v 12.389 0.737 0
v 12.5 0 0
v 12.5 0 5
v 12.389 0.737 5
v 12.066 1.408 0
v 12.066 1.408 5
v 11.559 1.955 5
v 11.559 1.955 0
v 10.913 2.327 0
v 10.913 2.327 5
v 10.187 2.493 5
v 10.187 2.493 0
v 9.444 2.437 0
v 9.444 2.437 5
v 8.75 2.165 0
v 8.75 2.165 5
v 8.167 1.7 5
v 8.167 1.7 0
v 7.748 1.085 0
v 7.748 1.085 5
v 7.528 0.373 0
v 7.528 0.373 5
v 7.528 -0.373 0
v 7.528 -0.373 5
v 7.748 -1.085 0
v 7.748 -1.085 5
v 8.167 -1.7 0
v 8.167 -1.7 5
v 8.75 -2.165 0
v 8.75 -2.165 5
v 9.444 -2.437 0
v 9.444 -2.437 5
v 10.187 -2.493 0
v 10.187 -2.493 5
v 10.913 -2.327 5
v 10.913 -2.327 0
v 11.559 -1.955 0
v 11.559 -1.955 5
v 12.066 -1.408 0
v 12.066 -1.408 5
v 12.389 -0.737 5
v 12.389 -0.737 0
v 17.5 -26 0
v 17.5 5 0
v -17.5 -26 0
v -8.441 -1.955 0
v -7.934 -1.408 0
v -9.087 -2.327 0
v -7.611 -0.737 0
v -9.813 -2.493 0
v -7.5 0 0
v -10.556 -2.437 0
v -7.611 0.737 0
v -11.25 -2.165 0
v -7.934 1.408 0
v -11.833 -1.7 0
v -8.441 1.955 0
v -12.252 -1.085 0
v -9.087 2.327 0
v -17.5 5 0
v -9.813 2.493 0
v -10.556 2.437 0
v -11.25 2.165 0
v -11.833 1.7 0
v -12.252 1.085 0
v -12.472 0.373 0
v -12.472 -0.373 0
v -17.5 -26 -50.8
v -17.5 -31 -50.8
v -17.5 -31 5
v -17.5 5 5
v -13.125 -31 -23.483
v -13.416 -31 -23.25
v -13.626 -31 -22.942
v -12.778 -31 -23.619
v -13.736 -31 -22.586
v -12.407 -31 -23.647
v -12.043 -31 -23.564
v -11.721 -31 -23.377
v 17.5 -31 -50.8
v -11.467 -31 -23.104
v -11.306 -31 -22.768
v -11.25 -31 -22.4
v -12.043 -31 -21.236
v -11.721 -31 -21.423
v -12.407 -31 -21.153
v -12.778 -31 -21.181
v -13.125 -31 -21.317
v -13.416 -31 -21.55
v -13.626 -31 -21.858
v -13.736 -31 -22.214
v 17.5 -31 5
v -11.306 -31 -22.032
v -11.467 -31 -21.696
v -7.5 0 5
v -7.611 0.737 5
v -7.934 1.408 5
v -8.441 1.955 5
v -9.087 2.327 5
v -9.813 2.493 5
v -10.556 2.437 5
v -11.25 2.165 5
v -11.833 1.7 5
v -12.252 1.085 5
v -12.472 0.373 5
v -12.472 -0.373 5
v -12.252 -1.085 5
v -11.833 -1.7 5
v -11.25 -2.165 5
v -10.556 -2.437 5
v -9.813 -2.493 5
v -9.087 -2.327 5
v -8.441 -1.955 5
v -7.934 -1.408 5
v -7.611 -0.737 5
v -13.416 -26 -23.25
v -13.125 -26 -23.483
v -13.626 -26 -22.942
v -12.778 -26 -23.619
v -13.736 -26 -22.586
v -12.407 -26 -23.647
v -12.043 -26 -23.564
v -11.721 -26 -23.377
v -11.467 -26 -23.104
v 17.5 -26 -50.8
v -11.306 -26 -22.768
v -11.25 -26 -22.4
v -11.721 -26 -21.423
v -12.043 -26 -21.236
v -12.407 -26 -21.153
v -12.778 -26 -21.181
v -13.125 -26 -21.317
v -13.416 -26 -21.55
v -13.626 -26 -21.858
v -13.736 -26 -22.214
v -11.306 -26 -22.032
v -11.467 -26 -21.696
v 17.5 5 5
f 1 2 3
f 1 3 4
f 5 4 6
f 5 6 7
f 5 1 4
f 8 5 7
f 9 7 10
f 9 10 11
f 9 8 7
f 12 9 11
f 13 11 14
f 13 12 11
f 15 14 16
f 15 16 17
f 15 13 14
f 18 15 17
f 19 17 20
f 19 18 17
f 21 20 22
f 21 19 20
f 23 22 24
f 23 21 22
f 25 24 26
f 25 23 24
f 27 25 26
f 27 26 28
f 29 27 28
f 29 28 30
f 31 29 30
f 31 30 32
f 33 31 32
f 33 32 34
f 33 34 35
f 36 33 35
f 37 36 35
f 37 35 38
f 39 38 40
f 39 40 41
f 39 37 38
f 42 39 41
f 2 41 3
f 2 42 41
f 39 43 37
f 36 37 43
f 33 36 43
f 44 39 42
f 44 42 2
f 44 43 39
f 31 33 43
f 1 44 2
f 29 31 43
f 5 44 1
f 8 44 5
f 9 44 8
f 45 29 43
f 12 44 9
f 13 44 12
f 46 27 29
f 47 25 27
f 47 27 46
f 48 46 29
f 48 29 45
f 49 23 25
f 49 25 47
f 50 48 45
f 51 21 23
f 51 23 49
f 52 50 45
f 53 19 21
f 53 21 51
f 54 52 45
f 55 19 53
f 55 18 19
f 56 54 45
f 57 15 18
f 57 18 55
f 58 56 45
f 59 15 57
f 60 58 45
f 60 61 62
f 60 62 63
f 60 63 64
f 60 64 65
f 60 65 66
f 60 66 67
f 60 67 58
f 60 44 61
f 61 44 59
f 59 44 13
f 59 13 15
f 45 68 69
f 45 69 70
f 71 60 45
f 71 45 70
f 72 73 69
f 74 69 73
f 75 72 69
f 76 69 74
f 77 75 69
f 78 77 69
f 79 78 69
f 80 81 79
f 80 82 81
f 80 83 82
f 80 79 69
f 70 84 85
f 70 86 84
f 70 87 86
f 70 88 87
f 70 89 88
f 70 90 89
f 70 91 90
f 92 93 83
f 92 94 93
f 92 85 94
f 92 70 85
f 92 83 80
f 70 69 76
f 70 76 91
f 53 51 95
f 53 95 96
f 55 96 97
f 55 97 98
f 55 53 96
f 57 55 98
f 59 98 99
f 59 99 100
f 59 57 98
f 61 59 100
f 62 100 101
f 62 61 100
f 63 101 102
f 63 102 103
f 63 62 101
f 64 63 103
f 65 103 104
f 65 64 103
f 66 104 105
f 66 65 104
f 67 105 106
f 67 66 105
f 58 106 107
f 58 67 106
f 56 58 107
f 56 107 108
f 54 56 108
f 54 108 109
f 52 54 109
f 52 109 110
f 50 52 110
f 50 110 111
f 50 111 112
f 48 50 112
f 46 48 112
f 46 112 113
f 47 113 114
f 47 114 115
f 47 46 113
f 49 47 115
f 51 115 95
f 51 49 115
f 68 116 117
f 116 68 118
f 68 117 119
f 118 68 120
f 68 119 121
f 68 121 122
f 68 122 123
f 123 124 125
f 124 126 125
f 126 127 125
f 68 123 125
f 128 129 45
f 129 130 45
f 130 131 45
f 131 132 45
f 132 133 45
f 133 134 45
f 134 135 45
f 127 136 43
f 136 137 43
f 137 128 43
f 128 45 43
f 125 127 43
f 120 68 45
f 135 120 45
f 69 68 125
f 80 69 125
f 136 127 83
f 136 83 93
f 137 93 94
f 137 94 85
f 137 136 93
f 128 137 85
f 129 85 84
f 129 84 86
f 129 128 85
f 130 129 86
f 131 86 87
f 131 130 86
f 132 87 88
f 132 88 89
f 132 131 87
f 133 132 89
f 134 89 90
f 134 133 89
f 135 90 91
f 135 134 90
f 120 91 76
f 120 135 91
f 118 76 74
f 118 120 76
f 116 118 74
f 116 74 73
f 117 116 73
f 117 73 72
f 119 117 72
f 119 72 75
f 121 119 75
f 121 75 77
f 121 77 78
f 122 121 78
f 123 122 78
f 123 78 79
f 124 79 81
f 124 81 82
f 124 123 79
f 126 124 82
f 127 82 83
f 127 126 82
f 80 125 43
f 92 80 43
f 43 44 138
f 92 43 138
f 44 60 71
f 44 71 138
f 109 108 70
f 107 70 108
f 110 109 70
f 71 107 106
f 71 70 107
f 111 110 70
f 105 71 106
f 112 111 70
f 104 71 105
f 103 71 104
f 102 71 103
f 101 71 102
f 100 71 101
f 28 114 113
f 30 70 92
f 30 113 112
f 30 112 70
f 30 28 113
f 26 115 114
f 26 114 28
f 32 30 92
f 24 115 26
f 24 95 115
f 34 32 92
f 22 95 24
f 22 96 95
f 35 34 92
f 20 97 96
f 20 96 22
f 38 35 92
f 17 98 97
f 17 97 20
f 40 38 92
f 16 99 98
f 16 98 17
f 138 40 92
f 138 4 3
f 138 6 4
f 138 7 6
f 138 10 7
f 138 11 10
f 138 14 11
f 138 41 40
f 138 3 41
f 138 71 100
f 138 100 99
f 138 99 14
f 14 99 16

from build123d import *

# Parameters (mm, degrees)
SKETCH1_R           = 2.5
BOSS_EXTRUDE1_DEPTH = 5
SKETCH2_W           = 35
SKETCH2_H           = 55.8
SKETCH2_R           = 1.25
BOSS_EXTRUDE2_DEPTH = 5


with BuildPart() as part:
    # Sketch1 → Boss-Extrude1 (new body)
    with BuildSketch(Plane.XY):
        Polygon((-17.5, 5), (17.5, 5), (17.5, -5), (17.5, -26), (-17.5, -26), (-17.5, -5), align=None)
        with Locations((-10, 0)):
            Circle(SKETCH1_R, mode=Mode.SUBTRACT)
        with Locations((10, 0)):
            Circle(SKETCH1_R, mode=Mode.SUBTRACT)
    extrude(amount=BOSS_EXTRUDE1_DEPTH)

    # Sketch2 → Boss-Extrude2 (add)
    with BuildSketch(Plane.XZ.offset(26)):
        with Locations((0, -22.9)):
            Rectangle(SKETCH2_W, SKETCH2_H)
        with Locations((-12.5, -22.4)):
            Circle(SKETCH2_R, mode=Mode.SUBTRACT)
    extrude(amount=BOSS_EXTRUDE2_DEPTH)


solid = part.part
